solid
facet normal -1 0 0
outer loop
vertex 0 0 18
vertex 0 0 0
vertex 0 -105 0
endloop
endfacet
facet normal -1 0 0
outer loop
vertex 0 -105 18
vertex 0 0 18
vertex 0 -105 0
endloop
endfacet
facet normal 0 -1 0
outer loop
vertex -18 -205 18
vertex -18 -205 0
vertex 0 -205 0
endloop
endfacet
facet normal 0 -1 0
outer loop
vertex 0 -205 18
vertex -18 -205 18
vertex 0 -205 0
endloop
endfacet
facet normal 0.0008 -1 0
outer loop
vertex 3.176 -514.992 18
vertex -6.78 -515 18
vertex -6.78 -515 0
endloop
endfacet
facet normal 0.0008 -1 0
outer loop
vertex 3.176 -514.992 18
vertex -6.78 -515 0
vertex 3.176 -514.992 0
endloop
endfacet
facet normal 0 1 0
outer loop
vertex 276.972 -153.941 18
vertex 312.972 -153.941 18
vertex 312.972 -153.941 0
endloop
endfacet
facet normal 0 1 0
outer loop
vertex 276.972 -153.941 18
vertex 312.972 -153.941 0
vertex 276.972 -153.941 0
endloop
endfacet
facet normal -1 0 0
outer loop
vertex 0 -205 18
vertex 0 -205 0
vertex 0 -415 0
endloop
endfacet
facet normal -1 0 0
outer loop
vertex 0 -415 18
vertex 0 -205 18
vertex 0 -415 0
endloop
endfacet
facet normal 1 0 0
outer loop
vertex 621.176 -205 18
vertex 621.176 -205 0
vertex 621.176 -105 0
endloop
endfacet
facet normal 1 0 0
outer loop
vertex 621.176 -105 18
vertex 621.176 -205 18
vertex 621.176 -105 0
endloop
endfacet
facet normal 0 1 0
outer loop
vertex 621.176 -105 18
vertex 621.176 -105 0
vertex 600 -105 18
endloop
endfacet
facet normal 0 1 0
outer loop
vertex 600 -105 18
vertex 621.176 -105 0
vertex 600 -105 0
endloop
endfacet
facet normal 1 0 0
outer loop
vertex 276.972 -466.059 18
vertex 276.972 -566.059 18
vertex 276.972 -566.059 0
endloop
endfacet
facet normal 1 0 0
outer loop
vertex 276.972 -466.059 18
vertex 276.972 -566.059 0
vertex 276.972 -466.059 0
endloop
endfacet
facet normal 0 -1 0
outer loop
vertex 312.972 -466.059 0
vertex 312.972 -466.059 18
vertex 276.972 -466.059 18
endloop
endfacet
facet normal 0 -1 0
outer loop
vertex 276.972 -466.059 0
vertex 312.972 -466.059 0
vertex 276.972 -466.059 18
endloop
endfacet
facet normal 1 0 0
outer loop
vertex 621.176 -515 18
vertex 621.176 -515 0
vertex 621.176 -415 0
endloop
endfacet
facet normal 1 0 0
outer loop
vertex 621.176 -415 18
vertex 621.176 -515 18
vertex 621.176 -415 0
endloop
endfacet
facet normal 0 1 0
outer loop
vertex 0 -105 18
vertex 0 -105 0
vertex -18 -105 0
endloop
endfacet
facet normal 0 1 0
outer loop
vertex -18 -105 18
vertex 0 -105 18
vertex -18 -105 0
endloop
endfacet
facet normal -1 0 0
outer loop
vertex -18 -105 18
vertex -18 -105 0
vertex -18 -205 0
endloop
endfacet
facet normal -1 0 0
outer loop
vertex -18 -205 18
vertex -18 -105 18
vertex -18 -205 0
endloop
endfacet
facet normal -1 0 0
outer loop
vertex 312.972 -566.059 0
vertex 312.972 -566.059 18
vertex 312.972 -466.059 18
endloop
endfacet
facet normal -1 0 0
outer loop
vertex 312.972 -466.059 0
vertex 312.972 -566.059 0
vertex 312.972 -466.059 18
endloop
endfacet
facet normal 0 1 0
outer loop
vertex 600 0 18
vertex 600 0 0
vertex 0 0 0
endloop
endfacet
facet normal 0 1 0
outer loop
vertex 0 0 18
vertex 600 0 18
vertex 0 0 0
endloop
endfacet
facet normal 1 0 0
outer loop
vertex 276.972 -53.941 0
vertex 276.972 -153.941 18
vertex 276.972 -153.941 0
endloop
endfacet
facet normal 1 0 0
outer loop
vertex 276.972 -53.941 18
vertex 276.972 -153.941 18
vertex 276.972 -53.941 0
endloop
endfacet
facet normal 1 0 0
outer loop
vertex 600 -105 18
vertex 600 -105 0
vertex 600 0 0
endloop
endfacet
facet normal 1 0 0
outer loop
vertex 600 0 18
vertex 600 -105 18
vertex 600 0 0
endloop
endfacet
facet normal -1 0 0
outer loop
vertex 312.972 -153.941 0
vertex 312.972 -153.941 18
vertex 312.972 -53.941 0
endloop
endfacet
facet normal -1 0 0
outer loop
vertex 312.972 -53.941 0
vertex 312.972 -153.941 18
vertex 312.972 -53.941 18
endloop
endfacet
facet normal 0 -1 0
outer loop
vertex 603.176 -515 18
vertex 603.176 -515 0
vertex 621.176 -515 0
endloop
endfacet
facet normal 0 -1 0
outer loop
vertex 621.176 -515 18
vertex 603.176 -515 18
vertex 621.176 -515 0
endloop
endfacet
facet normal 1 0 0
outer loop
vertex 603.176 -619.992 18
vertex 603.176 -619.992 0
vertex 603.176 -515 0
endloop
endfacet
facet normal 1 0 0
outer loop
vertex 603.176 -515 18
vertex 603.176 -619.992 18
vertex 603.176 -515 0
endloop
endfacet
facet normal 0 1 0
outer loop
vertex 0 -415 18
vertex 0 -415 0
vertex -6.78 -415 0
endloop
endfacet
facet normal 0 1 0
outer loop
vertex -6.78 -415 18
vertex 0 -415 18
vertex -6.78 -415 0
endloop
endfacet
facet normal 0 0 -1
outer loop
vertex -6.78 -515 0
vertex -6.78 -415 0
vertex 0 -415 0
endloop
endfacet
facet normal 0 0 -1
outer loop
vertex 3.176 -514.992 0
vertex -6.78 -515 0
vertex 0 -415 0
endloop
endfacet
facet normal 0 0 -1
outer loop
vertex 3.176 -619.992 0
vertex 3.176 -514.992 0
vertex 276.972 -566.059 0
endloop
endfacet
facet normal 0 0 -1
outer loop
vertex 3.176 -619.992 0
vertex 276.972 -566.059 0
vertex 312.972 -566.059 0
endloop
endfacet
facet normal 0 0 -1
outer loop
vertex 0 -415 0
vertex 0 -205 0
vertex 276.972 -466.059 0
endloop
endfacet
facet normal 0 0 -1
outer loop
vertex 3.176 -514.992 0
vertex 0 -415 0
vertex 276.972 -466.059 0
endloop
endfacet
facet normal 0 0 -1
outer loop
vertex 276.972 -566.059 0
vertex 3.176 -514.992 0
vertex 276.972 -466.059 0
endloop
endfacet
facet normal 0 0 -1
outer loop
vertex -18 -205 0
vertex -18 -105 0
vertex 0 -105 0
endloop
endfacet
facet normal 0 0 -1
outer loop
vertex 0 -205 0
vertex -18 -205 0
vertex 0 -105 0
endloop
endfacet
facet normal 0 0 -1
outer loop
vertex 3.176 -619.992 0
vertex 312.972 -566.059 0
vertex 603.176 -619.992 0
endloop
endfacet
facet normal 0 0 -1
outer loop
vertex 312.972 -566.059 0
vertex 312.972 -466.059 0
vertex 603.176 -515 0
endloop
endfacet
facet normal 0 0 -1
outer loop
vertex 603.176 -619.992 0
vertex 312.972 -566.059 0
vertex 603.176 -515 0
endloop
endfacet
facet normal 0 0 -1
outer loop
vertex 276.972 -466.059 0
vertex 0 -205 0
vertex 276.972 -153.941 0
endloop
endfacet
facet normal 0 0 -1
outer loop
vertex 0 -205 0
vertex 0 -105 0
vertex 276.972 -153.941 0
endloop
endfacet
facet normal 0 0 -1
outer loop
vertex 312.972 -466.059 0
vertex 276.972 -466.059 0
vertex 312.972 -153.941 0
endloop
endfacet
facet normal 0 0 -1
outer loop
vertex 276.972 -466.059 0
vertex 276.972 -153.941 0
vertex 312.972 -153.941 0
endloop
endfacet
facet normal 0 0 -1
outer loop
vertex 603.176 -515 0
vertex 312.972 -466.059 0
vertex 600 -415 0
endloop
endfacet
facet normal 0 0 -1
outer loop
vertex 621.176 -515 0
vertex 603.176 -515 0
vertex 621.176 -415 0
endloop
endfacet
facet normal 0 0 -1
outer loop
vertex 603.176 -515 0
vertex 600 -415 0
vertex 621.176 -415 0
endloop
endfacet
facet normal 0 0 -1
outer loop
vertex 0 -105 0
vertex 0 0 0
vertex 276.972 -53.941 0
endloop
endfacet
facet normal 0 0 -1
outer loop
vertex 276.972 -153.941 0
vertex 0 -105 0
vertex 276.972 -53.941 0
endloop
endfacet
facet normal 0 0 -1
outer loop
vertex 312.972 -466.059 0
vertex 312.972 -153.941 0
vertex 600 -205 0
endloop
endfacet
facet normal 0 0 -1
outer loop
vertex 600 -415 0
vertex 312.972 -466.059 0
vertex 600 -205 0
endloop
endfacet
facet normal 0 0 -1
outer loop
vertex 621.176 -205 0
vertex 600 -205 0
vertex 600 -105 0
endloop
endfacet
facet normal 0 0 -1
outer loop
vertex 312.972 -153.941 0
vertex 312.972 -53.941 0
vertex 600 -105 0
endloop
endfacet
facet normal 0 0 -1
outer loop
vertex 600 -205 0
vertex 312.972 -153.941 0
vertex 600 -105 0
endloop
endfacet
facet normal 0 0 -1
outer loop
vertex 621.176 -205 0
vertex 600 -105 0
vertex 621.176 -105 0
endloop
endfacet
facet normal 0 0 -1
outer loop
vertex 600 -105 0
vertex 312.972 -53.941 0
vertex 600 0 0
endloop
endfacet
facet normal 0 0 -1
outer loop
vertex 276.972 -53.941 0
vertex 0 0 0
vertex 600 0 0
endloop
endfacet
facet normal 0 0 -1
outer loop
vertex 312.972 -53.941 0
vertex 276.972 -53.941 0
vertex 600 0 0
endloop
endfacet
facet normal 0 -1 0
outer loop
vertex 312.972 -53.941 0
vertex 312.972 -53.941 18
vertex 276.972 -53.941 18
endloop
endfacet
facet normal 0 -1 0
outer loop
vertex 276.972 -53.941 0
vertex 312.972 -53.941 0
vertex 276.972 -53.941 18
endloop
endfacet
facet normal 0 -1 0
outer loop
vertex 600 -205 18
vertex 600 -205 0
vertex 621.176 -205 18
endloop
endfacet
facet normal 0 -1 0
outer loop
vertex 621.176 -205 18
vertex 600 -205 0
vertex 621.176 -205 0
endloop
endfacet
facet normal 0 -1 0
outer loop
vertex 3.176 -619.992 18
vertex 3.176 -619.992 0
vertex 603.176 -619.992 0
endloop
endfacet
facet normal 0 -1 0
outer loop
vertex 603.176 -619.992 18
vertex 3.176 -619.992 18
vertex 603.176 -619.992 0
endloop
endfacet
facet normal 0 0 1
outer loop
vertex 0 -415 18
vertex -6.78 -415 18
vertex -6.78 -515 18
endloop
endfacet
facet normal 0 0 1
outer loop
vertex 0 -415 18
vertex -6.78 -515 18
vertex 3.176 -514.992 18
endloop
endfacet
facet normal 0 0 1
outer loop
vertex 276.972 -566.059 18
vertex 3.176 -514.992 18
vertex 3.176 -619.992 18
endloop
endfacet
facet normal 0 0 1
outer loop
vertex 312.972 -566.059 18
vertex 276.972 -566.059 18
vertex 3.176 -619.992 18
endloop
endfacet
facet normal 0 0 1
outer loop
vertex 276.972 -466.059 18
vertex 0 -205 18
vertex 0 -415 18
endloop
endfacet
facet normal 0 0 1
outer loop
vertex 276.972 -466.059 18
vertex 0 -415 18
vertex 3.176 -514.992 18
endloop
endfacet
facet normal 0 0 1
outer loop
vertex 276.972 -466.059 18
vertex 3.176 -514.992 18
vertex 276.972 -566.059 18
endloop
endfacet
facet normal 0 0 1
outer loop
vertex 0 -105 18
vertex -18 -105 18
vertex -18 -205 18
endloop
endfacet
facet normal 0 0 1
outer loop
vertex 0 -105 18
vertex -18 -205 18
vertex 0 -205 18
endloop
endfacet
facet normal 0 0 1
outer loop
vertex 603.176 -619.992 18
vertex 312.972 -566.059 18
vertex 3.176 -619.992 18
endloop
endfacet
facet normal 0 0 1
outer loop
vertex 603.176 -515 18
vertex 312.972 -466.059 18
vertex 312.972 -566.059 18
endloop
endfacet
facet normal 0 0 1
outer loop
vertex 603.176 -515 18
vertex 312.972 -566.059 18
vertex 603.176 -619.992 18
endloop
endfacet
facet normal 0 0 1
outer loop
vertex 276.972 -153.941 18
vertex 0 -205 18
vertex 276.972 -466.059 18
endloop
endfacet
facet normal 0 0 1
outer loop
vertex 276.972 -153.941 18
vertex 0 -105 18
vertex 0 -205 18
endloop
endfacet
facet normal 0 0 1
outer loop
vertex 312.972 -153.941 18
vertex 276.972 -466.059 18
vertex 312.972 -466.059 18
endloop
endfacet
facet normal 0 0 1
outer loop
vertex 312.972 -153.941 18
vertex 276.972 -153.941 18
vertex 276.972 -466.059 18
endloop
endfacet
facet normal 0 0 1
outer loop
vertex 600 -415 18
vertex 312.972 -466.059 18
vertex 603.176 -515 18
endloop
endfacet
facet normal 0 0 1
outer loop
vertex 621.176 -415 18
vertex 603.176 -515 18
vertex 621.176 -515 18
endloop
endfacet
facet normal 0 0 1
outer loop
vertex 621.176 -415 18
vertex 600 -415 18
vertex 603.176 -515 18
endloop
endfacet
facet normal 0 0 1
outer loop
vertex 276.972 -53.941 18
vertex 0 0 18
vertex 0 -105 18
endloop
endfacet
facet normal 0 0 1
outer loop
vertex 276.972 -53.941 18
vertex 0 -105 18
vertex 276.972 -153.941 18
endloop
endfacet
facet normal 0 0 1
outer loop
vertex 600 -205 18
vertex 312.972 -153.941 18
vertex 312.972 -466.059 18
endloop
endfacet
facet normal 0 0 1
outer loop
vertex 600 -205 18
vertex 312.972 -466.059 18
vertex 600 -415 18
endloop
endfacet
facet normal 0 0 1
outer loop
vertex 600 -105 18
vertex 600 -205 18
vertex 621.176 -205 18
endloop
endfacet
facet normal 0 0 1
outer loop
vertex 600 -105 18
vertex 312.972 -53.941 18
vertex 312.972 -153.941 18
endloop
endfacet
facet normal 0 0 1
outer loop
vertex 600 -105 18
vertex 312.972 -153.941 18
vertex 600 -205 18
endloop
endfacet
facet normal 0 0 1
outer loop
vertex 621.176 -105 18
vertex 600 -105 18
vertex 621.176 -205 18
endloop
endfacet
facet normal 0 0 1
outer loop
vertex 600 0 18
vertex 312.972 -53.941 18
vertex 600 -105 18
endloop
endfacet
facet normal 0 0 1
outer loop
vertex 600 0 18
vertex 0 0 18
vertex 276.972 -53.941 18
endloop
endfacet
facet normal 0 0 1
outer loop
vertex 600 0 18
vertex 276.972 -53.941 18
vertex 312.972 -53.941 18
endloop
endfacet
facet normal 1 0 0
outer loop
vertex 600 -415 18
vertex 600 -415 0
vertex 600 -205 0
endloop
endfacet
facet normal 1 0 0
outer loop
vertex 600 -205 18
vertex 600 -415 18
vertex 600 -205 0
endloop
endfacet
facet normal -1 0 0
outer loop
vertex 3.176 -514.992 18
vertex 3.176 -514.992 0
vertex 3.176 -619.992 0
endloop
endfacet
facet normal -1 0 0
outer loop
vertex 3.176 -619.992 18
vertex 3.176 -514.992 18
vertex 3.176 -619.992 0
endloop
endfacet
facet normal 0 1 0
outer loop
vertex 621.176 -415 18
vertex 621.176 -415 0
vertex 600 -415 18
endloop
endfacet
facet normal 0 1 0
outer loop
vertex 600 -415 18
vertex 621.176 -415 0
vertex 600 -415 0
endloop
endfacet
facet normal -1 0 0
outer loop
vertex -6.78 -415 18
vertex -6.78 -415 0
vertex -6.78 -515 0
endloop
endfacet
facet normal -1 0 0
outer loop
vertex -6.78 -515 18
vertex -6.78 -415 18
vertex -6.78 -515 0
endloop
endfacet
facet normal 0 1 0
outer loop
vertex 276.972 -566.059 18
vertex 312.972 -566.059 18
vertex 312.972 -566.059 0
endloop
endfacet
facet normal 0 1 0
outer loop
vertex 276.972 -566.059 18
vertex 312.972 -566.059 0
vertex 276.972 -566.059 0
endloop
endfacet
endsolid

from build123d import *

# Parameters (mm, degrees)
BOSS_EXTRUDE3_DEPTH     = 18
CUT_EXTRUDE1_DEPTH      = 878.82331891
CUT_EXTRUDE1_DEPTH_BACK = 878.82331891
SKETCH2_W               = 36
SKETCH2_H               = 100


with BuildPart() as part:
    # Sketch1 → Boss-Extrude3 (new body)
    with BuildSketch(Plane.XY):
        Polygon((0, 0), (0, -105), (-18, -105), (-18, -205), (0, -205), (0, -415), (-6.780081157, -415), (-6.780081157, -515), (3.176196781, -514.99186428), (3.176196781, -619.99186428), (603.176196781, -619.99186428), (603.176196781, -515), (621.176196781, -515), (621.176196781, -415), (600, -415), (600, -205), (621.176196781, -205), (621.176196781, -105), (600, -105), (600, 0), align=None)
    extrude(amount=BOSS_EXTRUDE3_DEPTH)

    # Sketch2 → Cut-Extrude1 (cut, two sides: drawn at the far end of the back side and taken through both)
    with BuildSketch(Plane(origin=(0, 0, 0), x_dir=(-1, 0, 0), z_dir=(0, 0, -1)).offset(-CUT_EXTRUDE1_DEPTH_BACK)):
        with Locations((-294.972181327, -103.940998789)):
            Rectangle(SKETCH2_W, SKETCH2_H)
        with Locations((-294.972181327, -516.059001211)):
            Rectangle(SKETCH2_W, SKETCH2_H)
    extrude(amount=CUT_EXTRUDE1_DEPTH + CUT_EXTRUDE1_DEPTH_BACK, mode=Mode.SUBTRACT)


solid = part.part
